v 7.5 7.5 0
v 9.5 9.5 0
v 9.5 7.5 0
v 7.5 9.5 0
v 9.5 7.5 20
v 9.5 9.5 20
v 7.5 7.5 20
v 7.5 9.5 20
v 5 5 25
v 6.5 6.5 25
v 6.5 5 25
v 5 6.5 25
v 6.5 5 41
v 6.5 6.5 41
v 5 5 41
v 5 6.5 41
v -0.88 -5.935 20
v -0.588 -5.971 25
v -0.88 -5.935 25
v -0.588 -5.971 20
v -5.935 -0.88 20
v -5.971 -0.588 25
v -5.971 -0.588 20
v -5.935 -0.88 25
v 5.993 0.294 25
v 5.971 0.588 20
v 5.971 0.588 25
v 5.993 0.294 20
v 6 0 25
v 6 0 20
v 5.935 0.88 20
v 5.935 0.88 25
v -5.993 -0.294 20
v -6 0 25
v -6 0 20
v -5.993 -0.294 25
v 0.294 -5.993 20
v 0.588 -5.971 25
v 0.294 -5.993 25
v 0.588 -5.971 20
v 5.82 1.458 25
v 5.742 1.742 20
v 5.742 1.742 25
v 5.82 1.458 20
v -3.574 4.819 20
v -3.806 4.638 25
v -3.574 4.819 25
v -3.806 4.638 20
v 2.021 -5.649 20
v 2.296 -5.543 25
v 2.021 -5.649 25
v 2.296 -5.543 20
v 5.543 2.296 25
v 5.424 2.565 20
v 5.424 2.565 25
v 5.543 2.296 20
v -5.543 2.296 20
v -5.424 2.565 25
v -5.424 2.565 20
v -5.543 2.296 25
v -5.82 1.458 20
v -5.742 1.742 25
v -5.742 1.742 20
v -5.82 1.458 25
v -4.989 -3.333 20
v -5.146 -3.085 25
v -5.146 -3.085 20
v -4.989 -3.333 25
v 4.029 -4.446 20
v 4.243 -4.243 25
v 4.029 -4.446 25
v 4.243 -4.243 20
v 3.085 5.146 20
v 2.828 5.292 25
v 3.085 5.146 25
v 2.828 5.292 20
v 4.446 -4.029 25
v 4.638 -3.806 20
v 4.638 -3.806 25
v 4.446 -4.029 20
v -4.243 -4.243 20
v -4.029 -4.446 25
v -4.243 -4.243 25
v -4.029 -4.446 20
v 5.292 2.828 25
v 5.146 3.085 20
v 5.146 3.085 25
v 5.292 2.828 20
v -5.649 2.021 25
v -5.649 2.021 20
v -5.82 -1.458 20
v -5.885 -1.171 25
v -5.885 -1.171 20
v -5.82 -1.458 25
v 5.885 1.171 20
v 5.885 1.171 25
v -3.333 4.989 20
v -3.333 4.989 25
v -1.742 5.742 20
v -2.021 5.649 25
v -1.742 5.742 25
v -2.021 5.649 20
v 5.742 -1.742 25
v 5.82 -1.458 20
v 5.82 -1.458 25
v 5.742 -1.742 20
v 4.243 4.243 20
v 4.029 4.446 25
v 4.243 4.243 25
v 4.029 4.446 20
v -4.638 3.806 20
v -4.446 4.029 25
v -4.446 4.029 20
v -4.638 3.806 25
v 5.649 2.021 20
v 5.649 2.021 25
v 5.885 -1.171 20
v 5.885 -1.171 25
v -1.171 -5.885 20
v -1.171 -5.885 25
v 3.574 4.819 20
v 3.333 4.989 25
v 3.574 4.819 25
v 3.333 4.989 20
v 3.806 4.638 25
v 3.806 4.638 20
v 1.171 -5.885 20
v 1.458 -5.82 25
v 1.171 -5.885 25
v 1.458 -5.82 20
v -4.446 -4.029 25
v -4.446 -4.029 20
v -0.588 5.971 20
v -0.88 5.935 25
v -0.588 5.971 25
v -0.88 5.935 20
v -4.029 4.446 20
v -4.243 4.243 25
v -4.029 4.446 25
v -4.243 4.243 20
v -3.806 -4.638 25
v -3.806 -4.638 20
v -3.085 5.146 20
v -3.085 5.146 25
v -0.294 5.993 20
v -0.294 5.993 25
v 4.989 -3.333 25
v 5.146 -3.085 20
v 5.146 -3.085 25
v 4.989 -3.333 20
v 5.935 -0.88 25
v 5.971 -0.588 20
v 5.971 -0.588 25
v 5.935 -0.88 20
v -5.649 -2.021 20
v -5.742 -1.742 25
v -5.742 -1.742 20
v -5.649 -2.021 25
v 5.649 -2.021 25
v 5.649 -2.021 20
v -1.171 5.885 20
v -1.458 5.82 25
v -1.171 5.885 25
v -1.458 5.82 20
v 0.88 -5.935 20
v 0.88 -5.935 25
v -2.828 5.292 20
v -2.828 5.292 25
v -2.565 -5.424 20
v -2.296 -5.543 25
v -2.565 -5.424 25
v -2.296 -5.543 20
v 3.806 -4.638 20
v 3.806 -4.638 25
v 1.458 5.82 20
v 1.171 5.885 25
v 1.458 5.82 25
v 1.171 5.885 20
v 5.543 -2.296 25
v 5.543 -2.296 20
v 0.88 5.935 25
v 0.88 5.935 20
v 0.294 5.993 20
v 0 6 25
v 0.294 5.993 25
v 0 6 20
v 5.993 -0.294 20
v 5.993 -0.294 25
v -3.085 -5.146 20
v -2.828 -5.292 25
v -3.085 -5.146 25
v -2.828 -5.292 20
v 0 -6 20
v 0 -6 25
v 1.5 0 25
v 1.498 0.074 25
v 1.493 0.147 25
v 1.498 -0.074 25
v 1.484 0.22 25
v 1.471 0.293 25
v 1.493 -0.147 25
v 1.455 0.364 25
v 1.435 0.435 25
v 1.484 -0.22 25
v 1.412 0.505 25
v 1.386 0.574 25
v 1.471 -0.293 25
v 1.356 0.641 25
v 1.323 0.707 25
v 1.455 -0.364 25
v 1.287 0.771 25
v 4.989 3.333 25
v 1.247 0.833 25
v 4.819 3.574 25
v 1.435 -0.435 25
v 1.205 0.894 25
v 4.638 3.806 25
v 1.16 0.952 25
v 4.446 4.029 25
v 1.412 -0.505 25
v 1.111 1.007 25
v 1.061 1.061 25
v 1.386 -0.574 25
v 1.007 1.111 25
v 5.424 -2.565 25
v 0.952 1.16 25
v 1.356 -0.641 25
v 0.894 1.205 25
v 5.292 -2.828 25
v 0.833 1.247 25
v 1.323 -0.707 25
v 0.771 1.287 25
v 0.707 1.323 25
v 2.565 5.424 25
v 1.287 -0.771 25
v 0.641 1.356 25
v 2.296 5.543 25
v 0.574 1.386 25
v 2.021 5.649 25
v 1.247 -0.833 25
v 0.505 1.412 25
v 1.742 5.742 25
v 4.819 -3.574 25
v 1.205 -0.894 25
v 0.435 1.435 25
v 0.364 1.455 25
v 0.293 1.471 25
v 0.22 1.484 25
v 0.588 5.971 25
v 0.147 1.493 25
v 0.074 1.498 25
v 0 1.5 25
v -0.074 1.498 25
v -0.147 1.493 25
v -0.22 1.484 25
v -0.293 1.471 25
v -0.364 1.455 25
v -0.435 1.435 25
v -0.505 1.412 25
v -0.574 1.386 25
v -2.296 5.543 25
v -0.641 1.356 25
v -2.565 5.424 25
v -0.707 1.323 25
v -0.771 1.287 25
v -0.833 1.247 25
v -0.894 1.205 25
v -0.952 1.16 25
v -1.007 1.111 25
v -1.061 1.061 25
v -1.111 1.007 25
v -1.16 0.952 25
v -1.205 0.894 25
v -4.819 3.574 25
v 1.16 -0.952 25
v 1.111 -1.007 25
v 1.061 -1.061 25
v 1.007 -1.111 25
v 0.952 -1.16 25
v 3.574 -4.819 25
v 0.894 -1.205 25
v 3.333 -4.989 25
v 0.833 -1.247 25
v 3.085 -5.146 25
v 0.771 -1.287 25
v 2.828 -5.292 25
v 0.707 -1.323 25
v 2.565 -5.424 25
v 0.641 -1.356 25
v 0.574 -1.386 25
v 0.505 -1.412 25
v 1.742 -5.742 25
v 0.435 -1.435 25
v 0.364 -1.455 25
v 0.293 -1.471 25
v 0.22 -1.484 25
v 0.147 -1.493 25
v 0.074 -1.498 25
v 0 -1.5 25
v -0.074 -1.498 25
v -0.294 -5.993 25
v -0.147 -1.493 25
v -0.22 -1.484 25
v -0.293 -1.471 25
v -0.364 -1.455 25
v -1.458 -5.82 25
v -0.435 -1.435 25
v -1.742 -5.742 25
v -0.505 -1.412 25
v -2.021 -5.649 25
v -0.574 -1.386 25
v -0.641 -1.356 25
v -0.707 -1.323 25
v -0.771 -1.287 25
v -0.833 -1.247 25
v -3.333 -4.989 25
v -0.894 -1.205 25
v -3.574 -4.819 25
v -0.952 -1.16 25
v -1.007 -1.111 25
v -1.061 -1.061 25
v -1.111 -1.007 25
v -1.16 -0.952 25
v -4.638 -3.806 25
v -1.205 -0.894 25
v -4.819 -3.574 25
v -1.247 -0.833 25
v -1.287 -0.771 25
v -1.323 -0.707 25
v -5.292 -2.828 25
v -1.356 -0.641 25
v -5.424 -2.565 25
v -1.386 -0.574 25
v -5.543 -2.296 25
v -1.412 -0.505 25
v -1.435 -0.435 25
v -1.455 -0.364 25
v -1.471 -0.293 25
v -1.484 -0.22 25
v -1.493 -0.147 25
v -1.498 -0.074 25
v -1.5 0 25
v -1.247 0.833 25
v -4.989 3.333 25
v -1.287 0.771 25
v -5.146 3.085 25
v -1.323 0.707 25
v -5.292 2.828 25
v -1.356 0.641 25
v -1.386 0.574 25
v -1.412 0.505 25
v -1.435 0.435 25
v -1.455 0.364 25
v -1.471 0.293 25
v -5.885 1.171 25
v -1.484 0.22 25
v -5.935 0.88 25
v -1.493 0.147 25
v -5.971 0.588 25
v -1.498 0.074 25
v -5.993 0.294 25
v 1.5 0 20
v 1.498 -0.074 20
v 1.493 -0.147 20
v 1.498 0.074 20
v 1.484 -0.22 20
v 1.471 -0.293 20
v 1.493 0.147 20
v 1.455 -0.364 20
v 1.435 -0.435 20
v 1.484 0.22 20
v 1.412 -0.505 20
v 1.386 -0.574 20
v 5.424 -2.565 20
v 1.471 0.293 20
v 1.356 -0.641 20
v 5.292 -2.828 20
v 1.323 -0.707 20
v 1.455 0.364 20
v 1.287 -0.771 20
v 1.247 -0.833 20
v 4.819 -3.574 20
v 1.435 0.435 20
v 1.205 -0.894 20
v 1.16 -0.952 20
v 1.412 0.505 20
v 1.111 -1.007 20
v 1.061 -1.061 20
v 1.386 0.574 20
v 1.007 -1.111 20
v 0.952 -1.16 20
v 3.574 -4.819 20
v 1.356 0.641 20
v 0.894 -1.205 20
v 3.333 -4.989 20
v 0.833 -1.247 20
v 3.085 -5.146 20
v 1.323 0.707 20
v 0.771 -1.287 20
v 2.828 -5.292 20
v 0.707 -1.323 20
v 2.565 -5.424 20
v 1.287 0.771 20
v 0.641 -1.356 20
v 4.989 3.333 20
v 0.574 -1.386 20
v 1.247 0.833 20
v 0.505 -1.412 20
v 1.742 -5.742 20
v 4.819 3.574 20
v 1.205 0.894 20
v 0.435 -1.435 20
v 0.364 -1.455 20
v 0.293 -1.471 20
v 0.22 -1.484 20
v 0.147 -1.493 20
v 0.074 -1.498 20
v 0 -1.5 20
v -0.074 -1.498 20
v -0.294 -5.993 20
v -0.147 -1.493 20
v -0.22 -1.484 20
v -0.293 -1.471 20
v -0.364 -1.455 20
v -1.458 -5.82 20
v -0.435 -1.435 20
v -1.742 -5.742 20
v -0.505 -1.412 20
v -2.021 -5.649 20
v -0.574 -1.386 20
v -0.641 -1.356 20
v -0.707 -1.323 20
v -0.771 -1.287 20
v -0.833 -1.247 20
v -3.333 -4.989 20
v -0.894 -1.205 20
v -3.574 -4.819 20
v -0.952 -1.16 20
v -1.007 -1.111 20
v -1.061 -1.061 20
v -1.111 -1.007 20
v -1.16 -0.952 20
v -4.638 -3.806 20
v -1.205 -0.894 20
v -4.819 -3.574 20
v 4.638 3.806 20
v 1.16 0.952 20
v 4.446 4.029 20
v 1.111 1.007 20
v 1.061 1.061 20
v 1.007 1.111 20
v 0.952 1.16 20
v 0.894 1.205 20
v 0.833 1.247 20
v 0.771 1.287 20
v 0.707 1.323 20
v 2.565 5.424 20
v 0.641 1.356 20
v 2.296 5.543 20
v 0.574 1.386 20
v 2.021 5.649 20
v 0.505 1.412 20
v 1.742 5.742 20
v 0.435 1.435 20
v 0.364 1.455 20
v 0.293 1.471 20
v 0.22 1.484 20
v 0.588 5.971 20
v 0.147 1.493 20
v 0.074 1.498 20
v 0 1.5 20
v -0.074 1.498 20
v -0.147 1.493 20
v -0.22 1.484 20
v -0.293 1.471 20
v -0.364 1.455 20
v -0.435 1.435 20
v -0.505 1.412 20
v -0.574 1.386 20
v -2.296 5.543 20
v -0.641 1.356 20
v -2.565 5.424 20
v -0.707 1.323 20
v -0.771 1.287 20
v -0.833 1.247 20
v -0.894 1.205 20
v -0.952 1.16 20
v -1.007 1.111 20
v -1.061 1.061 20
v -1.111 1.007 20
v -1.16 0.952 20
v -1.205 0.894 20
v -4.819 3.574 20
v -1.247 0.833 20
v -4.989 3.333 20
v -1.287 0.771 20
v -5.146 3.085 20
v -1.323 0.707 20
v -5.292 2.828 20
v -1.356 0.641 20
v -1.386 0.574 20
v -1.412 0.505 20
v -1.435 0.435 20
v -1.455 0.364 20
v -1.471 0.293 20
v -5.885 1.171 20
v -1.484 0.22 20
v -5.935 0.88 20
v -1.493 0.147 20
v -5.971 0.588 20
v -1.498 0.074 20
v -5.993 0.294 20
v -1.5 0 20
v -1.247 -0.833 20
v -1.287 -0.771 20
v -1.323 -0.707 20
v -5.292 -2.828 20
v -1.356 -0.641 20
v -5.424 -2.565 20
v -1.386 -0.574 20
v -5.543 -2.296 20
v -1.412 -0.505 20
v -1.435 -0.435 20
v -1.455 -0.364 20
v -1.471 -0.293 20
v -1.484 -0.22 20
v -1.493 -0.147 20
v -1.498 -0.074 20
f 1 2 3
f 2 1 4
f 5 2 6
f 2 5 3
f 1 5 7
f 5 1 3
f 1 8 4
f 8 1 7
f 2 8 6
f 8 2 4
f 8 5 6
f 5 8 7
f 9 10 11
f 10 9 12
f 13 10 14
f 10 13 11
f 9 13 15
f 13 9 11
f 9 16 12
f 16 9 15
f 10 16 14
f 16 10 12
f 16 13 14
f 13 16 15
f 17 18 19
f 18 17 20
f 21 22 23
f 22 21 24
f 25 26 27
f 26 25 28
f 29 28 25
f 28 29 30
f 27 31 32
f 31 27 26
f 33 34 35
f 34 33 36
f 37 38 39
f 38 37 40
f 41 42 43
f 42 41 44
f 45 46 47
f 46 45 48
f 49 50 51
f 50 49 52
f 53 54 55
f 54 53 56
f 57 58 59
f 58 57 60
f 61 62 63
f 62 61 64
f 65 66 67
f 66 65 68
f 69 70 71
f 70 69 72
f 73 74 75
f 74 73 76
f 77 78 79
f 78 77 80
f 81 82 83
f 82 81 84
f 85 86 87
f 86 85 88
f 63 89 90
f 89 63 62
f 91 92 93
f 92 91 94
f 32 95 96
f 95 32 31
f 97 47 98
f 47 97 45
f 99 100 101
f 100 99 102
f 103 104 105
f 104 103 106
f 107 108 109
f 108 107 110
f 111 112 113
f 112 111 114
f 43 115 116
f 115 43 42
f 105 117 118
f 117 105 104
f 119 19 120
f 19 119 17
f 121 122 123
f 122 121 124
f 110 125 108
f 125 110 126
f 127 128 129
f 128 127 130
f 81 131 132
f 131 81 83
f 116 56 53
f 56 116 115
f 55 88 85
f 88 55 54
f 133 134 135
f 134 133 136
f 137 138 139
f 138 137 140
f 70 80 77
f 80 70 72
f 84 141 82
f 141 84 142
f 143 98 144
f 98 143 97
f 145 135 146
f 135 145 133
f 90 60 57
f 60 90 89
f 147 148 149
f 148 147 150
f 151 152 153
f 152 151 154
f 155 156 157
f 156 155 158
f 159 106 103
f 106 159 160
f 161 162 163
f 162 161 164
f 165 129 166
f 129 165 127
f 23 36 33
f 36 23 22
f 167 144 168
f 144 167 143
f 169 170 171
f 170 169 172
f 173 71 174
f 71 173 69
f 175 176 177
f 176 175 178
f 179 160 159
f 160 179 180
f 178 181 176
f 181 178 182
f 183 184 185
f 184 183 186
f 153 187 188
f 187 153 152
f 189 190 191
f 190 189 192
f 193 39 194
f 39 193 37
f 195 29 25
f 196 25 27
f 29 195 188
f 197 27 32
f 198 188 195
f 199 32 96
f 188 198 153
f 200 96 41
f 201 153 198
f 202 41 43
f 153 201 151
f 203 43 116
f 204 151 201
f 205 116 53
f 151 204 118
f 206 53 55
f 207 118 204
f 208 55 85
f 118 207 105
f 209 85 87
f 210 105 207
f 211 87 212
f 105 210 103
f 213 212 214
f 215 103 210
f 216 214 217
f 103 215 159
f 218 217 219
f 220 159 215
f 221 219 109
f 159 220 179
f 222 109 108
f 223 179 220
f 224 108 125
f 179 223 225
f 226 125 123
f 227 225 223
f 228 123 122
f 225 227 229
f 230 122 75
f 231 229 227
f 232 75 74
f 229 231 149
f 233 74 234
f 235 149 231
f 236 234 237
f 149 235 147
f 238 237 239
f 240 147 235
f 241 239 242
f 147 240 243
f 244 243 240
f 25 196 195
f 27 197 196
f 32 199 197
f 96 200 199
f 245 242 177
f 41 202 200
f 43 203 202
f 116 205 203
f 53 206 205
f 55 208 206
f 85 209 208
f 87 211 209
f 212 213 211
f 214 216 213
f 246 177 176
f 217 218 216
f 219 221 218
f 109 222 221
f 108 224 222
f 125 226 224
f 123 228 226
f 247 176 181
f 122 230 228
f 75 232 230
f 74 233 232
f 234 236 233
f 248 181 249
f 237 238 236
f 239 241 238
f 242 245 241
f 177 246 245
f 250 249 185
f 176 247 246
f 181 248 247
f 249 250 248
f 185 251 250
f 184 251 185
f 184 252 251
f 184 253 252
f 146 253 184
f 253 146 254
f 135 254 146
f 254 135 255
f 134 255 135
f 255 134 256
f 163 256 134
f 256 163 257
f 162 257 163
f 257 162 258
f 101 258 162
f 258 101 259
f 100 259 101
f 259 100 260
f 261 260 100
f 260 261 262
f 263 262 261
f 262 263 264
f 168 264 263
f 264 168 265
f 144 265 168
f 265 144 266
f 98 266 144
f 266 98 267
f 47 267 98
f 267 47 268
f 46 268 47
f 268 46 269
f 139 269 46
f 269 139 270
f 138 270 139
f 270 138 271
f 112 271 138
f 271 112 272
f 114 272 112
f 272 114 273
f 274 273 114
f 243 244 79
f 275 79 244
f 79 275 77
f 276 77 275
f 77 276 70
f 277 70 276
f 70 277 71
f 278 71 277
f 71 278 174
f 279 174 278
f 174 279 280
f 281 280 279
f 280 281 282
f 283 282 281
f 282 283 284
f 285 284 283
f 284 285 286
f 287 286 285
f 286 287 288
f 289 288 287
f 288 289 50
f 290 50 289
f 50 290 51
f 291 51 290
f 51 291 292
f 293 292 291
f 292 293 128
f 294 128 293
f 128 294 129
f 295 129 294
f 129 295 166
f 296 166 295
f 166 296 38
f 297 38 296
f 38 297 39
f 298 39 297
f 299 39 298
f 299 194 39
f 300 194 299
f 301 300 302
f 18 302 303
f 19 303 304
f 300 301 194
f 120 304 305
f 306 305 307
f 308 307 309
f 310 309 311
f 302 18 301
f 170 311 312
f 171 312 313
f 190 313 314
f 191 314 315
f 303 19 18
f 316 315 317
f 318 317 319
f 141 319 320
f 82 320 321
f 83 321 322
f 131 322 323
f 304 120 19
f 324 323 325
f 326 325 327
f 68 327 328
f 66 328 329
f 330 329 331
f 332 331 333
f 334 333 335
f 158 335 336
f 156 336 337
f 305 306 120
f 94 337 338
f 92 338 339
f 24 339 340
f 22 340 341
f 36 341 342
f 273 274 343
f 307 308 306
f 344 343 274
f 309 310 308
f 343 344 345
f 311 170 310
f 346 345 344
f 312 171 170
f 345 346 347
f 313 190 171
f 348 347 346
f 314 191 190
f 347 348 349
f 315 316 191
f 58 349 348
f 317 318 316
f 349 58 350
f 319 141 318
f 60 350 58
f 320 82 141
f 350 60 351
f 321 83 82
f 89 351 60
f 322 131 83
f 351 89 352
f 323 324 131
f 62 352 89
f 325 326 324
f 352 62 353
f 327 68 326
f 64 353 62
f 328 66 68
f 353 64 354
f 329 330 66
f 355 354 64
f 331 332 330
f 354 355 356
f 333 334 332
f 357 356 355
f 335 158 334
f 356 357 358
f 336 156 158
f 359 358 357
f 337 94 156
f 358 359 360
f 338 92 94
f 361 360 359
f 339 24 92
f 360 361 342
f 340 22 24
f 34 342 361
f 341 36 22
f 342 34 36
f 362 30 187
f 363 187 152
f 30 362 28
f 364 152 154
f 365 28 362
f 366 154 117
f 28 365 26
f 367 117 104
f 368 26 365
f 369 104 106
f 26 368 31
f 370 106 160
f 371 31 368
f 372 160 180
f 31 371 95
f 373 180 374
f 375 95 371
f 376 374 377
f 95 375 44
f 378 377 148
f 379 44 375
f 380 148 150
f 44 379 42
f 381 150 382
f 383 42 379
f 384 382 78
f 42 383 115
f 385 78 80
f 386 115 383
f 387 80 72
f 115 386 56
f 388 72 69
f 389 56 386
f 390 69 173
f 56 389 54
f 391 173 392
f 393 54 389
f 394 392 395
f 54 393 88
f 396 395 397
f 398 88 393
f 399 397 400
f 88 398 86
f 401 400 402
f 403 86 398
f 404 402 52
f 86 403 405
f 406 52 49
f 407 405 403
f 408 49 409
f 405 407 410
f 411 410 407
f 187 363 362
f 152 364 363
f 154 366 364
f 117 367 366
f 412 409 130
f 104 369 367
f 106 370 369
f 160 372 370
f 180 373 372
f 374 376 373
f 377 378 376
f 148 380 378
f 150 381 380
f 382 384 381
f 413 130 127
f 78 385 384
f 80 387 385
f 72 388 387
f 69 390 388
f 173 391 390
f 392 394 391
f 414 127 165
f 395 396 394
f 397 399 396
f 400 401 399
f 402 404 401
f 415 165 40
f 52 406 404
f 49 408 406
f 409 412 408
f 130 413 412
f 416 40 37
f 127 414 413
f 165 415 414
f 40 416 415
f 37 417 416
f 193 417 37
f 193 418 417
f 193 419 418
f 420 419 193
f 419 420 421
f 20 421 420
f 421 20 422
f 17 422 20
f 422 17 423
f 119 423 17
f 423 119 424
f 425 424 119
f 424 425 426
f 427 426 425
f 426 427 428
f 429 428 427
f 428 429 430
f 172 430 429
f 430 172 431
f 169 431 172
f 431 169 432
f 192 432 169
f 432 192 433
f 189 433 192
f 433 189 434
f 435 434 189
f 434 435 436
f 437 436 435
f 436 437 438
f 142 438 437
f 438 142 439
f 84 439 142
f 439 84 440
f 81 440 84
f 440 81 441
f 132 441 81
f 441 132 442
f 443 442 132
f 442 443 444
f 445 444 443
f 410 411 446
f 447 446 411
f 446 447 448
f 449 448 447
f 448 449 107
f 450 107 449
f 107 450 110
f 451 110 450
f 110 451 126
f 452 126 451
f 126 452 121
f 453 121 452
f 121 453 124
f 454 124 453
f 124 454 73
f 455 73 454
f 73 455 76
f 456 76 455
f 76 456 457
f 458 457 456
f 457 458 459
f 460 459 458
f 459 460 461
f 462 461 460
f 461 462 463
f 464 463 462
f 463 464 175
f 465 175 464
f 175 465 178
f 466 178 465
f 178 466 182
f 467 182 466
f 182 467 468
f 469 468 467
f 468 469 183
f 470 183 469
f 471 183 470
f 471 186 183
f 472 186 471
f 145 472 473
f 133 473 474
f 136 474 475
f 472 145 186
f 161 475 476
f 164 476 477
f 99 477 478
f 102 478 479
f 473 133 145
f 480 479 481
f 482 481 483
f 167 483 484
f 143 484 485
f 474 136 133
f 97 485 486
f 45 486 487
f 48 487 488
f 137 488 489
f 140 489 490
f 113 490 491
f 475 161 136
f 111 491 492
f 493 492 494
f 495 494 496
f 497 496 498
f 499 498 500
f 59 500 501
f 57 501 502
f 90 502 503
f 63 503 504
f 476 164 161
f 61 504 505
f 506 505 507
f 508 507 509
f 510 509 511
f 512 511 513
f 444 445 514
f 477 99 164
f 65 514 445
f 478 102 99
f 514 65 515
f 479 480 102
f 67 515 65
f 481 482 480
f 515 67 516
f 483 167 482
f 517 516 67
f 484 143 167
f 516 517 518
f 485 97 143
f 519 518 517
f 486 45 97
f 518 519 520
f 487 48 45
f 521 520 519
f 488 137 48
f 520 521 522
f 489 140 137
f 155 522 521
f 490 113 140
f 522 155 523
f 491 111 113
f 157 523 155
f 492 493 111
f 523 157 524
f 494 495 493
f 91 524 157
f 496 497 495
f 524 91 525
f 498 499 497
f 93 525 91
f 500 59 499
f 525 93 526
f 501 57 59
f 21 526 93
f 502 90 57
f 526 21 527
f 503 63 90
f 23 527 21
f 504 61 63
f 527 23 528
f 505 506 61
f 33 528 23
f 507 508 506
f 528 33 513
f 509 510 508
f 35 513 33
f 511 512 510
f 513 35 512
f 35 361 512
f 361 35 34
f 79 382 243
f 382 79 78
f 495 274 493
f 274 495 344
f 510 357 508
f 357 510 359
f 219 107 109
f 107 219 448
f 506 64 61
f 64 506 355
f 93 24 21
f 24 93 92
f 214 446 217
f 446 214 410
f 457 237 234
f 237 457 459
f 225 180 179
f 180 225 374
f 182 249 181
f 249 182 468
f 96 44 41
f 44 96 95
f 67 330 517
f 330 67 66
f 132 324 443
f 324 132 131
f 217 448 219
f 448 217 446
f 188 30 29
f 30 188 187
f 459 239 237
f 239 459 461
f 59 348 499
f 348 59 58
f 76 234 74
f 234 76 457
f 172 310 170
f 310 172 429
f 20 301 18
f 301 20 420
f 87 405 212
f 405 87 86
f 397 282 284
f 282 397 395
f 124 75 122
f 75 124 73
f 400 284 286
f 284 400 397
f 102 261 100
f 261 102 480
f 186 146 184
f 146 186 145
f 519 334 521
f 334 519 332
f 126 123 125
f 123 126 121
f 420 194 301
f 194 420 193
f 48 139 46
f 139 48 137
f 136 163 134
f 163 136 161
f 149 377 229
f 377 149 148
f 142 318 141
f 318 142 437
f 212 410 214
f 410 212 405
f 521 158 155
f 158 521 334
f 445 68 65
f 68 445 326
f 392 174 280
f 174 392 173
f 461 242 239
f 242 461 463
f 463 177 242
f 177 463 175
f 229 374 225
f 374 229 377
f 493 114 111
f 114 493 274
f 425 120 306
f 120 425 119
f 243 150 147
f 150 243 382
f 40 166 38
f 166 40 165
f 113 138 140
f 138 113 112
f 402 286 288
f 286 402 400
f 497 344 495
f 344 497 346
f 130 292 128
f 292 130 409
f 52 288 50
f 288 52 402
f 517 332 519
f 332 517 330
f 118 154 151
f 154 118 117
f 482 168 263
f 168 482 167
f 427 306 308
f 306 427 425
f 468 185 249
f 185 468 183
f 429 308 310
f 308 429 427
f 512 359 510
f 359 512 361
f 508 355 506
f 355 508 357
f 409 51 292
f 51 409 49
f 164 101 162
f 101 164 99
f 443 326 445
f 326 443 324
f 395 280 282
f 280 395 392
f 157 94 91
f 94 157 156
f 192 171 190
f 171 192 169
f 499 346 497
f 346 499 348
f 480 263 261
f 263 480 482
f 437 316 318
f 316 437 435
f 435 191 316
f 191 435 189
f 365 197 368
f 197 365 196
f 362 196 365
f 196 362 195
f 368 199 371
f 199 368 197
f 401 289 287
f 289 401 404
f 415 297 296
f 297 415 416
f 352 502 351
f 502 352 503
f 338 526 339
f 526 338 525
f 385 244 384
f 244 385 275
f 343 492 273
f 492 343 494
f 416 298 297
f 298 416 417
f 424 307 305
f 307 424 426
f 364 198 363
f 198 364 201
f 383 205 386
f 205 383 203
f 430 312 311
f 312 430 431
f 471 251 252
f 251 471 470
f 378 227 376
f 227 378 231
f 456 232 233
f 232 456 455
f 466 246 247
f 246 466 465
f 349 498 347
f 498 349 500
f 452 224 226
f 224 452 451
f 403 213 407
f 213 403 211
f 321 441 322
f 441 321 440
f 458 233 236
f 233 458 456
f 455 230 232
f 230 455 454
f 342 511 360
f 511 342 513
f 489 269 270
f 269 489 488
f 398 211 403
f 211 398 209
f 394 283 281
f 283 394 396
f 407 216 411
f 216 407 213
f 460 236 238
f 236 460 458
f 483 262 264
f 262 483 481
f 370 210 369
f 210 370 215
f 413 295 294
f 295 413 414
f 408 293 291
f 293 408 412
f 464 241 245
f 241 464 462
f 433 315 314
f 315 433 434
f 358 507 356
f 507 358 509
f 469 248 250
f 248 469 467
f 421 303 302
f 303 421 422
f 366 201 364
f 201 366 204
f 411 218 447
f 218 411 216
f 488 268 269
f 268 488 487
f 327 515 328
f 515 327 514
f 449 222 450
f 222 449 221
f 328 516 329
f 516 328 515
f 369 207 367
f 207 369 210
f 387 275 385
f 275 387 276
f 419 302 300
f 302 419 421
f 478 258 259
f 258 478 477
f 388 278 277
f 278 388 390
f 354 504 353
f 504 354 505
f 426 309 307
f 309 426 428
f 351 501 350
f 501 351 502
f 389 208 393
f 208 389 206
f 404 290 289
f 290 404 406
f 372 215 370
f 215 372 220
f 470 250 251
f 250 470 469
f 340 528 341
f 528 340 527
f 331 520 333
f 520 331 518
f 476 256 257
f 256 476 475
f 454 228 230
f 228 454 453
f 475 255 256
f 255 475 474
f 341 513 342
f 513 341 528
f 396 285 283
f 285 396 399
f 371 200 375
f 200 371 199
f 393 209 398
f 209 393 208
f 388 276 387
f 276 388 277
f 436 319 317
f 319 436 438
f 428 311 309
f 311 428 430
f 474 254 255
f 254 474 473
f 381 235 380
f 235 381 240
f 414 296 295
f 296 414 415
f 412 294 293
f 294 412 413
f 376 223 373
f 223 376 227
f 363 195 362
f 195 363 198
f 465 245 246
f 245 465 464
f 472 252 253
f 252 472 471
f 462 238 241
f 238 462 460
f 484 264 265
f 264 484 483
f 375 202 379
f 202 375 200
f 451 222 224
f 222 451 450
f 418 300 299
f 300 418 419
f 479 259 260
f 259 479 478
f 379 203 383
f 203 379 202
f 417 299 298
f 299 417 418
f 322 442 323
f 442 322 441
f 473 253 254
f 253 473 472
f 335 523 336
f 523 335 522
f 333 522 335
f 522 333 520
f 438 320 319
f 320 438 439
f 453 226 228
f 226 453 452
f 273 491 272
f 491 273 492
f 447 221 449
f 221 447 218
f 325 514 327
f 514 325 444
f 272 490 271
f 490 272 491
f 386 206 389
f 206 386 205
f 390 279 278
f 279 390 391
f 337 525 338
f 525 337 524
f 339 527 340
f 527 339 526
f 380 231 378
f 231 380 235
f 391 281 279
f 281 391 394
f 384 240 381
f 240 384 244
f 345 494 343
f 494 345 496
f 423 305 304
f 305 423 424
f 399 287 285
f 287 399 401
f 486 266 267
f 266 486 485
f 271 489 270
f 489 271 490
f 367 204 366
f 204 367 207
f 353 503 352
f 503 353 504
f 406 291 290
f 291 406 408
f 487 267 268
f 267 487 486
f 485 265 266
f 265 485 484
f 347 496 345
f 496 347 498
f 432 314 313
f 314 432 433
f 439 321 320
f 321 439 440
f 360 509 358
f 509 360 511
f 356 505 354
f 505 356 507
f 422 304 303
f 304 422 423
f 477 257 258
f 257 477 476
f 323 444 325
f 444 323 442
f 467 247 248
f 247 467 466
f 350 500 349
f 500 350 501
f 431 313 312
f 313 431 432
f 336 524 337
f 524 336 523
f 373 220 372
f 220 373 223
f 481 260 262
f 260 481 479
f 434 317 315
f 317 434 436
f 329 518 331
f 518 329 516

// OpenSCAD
// Straight hose-barb reducer: 8 mm tubing to 5 mm tubing
// Print orientation: upright along Z, resting on XY plane at z = 0

$fn = 128;

// ---- Dimensions (mm) ----
collar_d      = 12;    // collar outer diameter
bore_d        = 3;     // through-bore diameter
barb_8_bottom = 7.5;   // 8 mm barb OD at bottom
barb_8_top    = 9.5;   // 8 mm barb OD at top
barb_5_bottom = 6.5;   // 5 mm barb OD at bottom
barb_5_top    = 5.0;   // 5 mm barb OD at top
eps           = 0.5;   // cutter overshoot

// ---- Model ----
difference() {
    union() {
        // 8 mm barbs, stacked
        for (z = [0, 10])
            translate([0, 0, z])
                linear_extrude(height = 10)
                    polygon(points = [[barb_8_bottom, barb_8_bottom],
                                       [barb_8_top, barb_8_bottom],
                                       [barb_8_top, barb_8_top],
                                       [barb_8_bottom, barb_8_top]]);
        // collar
        translate([0, 0, 20])
            cylinder(d = collar_d, h = 5);
        // 5 mm barbs, stacked
        for (z = [25, 33])
            translate([0, 0, z])
                linear_extrude(height = 8)
                    polygon(points = [[barb_5_bottom, barb_5_bottom],
                                       [barb_5_top, barb_5_bottom],
                                       [barb_5_top, barb_5_top],
                                       [barb_5_bottom, barb_5_top]]);
    }
    // through-bore, full length
    translate([0, 0, -eps])
        cylinder(d = bore_d, h = 41 + 2 * eps);
}
